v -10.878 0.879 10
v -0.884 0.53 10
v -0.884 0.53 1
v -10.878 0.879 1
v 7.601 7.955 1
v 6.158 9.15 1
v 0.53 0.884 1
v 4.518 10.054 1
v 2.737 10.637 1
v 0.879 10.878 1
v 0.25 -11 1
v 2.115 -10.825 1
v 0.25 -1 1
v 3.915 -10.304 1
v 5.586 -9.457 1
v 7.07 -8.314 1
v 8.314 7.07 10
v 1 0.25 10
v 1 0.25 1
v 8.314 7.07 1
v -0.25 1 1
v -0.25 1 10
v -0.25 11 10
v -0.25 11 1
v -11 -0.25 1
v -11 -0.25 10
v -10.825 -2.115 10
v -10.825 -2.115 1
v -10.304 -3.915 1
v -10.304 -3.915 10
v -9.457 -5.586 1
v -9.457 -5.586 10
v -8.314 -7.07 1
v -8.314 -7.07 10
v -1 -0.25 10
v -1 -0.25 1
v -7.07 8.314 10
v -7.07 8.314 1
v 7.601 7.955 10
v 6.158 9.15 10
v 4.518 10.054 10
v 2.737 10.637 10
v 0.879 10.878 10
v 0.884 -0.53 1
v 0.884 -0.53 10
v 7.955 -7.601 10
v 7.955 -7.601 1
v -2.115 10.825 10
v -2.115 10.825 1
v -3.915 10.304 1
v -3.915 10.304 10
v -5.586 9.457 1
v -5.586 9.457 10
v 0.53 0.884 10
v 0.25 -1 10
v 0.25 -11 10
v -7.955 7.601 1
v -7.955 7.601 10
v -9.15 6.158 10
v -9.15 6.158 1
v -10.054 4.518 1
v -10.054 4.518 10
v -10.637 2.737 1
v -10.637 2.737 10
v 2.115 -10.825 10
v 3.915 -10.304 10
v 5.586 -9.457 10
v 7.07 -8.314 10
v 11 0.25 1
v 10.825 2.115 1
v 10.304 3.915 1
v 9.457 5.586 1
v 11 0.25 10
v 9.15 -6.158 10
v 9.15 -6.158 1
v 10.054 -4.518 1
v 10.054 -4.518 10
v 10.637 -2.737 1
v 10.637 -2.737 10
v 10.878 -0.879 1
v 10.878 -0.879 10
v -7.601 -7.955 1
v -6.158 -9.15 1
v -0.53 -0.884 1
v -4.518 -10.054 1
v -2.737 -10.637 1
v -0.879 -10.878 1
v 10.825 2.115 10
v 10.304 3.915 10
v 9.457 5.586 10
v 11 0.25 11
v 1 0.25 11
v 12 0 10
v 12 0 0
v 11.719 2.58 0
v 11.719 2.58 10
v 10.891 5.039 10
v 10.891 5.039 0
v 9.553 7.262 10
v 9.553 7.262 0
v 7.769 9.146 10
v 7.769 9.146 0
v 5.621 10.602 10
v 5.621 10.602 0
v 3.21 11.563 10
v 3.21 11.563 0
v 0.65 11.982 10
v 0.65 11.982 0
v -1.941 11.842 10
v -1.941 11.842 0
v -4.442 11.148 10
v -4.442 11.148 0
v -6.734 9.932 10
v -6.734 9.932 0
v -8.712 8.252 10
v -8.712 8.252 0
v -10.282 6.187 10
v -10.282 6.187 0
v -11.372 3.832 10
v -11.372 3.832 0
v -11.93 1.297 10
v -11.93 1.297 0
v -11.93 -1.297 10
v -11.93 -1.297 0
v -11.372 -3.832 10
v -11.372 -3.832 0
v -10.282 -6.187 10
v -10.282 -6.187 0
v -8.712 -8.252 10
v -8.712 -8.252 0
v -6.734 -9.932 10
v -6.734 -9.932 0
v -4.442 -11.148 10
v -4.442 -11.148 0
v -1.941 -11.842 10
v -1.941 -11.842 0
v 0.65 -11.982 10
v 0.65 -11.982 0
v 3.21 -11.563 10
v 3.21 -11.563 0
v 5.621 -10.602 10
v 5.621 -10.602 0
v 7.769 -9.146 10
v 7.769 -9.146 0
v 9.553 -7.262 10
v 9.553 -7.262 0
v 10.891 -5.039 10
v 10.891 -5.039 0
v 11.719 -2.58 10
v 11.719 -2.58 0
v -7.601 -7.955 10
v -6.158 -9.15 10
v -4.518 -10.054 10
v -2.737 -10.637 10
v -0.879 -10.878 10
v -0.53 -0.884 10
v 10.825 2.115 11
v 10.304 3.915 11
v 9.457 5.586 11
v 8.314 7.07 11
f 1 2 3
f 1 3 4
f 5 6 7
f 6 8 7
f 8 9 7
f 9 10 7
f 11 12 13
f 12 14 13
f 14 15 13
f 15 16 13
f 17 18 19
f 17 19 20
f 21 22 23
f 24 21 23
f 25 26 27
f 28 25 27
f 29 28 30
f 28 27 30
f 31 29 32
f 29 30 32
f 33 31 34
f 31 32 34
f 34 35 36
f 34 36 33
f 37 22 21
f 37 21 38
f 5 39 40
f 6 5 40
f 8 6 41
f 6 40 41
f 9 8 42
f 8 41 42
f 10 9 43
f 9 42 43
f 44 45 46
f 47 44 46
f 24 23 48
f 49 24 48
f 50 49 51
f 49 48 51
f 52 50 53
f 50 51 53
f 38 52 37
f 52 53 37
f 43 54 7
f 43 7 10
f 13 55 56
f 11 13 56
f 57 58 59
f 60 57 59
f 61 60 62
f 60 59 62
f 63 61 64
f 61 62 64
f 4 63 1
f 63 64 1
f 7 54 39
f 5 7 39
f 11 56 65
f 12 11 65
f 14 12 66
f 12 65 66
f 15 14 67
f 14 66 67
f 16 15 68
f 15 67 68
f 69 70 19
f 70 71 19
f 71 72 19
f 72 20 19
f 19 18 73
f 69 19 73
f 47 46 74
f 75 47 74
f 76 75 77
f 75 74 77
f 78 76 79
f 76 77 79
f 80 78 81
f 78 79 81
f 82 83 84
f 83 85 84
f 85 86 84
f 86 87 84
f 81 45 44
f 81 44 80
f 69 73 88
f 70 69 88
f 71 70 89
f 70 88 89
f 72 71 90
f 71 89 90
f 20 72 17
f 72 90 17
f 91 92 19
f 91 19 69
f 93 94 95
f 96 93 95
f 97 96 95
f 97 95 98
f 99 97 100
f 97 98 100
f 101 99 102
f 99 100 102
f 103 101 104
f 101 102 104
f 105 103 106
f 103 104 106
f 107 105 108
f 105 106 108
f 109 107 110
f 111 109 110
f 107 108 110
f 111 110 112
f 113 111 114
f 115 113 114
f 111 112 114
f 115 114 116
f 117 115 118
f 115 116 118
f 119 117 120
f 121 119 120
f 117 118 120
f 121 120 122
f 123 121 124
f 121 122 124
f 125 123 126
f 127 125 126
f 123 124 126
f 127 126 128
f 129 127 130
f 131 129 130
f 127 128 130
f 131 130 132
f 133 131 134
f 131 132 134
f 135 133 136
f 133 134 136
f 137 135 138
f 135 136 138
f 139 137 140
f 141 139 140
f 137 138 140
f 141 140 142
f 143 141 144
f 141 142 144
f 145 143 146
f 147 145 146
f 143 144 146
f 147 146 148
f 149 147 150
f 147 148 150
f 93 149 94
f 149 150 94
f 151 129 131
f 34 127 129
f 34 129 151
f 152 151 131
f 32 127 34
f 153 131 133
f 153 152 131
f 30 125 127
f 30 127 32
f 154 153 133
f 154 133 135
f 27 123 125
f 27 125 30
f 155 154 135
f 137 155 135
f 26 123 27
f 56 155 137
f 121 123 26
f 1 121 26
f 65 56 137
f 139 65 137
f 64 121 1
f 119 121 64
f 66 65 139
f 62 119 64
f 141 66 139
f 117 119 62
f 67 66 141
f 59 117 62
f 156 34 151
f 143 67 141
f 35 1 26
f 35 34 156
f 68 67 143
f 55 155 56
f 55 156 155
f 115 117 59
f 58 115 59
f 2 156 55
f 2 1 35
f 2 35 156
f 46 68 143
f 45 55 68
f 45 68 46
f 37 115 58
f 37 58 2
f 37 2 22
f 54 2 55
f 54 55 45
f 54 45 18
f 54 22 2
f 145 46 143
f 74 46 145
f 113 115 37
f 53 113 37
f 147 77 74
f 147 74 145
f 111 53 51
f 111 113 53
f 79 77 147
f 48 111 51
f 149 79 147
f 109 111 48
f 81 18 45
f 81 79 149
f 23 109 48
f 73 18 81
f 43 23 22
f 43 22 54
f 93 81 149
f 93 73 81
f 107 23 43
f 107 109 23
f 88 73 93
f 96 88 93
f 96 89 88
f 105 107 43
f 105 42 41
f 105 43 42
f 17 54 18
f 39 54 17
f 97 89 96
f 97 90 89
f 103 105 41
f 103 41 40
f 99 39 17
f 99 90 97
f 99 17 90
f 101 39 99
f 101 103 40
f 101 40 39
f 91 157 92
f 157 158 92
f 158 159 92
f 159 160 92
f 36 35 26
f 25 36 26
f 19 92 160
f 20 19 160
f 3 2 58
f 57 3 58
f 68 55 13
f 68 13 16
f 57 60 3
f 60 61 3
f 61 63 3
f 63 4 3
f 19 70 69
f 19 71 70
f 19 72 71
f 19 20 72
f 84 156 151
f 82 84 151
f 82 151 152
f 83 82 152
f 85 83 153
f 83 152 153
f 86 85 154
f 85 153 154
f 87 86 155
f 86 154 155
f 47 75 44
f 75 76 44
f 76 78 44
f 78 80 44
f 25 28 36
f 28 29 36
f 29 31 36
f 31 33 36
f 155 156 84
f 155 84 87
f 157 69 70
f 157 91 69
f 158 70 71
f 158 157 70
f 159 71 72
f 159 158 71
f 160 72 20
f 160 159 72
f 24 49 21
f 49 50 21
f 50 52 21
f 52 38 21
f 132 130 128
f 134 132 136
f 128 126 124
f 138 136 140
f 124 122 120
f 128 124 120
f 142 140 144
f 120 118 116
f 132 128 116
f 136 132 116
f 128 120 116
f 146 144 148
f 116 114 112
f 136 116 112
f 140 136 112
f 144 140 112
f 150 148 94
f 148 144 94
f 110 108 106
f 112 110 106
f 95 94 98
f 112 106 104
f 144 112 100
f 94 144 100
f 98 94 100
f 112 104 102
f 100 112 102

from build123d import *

# Parameters (mm, degrees)
CYLINDER001_W     = 10
CYLINDER001_H     = 10
CYLINDER001_ANGLE = 43
ARRAY_COUNT       = 8
CYLINDER_R        = 12
CYLINDER_DEPTH    = 10
CYLINDER002_W     = 10
CYLINDER002_H     = 10
CYLINDER002_ANGLE = 43


with BuildPart() as array:
    # Cylinder001 → Cylinder001 (revolve)
    with BuildSketch(Plane(origin=(1, 0.25, 1), x_dir=(1, 0, 0), z_dir=(0, -1, 0))):
        with Locations((5, 5)):
            Rectangle(CYLINDER001_W, CYLINDER001_H)
    revolve(axis=Axis((1, 0.25, 1), (0, 0, 1)), revolution_arc=CYLINDER001_ANGLE)

    # Array: Array ×8 about axis
    array_axis = Axis((0, 0, 1), (0, 0, 1))


with BuildPart() as array_1:
    add(array.part)
    for i in range(1, ARRAY_COUNT):
        add(array.part.rotate(array_axis, i * 360 / ARRAY_COUNT))


with BuildPart() as caixa:
    # Cylinder → Cylinder (new body)
    with BuildSketch(Plane.XY):
        Circle(CYLINDER_R)
    extrude(amount=CYLINDER_DEPTH)

    # Cut: cut Array
    add(array_1.part, mode=Mode.SUBTRACT)


with BuildPart() as caserio001:
    # Cylinder002 → Cylinder002 (revolve)
    with BuildSketch(Plane(origin=(1, 0.25, 1), x_dir=(1, 0, 0), z_dir=(0, -1, 0))):
        with Locations((5, 5)):
            Rectangle(CYLINDER002_W, CYLINDER002_H)
    revolve(axis=Axis((1, 0.25, 1), (0, 0, 1)), revolution_arc=CYLINDER002_ANGLE)


solid = Compound([caixa.part, caserio001.part])
